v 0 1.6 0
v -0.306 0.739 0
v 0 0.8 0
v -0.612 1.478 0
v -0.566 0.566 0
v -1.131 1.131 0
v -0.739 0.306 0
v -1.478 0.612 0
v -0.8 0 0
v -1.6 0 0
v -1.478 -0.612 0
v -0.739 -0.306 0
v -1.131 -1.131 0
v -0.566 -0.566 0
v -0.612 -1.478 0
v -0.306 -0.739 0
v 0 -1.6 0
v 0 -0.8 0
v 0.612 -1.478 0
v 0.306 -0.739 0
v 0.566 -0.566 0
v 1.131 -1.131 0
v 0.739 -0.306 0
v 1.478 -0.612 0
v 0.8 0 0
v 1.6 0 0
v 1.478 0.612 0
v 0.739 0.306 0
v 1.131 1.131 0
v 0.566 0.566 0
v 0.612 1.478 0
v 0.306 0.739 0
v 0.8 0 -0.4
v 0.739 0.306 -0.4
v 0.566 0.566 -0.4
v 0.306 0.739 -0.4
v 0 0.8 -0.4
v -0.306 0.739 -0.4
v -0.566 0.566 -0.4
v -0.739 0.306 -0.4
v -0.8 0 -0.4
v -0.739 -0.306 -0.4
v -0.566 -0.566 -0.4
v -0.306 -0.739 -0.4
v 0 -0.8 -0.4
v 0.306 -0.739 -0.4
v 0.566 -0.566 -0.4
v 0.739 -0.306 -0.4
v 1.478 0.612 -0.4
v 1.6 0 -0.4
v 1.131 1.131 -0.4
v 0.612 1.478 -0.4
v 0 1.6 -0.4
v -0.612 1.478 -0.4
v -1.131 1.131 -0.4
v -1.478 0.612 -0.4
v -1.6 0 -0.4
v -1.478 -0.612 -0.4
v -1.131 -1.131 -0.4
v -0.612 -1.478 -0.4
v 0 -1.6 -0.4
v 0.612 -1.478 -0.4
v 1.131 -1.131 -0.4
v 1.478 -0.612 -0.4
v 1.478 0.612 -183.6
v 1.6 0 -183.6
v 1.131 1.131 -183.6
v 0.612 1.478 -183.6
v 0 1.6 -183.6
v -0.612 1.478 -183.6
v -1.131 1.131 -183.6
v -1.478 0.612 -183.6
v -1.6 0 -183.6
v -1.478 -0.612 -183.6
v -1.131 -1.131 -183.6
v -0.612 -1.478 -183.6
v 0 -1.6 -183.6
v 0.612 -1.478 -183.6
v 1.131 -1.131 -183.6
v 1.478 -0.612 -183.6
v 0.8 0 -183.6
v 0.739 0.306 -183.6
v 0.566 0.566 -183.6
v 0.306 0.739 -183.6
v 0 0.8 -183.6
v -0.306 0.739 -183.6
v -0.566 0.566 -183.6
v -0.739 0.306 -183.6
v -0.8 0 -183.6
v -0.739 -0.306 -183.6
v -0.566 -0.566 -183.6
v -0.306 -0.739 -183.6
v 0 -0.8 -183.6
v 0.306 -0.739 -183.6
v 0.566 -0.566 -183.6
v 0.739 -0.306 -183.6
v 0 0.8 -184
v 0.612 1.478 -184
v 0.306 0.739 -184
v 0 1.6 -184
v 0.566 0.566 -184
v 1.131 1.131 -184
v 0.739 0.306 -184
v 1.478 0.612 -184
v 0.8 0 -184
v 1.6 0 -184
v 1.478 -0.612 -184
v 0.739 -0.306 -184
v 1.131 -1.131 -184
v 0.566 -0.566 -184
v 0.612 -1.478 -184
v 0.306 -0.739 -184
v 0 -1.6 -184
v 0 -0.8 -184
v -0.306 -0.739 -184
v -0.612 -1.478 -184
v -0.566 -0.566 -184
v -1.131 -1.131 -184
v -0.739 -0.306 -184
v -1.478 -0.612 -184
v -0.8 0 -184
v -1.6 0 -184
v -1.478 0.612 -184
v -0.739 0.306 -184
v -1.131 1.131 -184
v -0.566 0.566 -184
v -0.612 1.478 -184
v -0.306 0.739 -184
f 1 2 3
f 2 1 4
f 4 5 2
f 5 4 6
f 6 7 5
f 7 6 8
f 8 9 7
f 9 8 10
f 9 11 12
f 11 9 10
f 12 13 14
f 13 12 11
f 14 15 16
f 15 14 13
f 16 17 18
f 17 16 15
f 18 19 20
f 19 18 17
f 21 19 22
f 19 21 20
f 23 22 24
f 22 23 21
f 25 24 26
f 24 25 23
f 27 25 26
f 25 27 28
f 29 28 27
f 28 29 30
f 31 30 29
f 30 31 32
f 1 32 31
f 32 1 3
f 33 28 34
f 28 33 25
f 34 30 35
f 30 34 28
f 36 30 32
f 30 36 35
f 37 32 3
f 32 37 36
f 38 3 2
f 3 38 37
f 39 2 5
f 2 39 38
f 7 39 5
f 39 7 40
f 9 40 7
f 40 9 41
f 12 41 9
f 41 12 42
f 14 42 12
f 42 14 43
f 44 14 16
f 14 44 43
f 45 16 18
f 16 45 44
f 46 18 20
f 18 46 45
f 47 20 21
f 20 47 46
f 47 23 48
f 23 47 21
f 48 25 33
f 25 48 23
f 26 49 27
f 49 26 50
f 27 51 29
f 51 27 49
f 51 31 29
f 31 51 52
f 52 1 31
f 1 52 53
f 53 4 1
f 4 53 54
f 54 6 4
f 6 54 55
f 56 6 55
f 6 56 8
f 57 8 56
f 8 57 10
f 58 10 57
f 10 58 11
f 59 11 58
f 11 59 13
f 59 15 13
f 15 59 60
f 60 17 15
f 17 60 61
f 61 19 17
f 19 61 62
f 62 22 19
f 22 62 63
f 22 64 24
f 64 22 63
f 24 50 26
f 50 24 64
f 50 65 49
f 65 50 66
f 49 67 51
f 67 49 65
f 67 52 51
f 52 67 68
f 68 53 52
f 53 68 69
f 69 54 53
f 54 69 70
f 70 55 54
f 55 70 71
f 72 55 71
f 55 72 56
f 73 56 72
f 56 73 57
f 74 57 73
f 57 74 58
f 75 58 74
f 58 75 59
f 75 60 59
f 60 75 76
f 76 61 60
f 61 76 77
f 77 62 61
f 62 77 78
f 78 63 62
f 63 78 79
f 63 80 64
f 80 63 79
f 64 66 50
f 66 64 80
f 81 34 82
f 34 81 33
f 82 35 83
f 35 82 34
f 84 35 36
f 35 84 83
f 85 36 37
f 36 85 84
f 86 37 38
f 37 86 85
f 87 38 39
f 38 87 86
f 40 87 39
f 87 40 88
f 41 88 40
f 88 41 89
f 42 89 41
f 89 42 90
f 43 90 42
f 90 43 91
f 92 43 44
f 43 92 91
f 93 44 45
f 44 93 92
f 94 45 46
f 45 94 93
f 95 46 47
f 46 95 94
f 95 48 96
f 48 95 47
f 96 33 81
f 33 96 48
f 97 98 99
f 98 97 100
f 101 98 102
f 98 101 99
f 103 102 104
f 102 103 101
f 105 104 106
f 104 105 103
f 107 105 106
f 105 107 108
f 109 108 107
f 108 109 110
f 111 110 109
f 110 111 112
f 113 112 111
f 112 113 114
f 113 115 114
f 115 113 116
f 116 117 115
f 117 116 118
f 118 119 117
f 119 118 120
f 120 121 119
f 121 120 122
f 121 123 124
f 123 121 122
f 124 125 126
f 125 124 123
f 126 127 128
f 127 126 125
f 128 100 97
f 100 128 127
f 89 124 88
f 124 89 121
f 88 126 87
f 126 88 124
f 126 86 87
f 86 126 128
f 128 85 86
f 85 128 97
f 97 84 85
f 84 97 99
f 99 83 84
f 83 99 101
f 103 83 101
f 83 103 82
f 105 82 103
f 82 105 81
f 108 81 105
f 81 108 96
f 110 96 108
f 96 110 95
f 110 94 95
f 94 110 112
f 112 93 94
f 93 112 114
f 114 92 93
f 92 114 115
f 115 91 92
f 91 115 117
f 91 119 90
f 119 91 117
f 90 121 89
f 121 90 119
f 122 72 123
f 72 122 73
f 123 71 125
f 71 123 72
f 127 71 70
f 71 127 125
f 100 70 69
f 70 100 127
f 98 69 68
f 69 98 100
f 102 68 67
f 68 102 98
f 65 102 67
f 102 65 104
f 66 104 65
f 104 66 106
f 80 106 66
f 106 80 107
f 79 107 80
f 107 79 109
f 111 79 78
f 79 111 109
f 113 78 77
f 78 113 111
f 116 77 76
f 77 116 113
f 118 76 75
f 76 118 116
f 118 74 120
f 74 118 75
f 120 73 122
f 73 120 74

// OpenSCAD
// file: ../p/4-4ring1.scad
use <../lib.scad>
function ldraw_lib__4_4ring1() = [
// 0 Ring  1 x 1.0
// 0 Name: 4-4ring1.dat
// 0 Author: James Jessiman
// 0 !LDRAW_ORG Primitive UPDATE 2009-01
// 0 !LICENSE Licensed under CC BY 2.0 and CC BY 4.0 : see CAreadme.txt
// 
// 0 BFC CERTIFY CCW
  [0,"BFC","CERTIFY"],
  [0,"BFC","CCW"],
// 
// 0 !HISTORY 1998-12-15 [PTadmin] Official Update 1998-10
// 0 !HISTORY 2002-04-08 [BrickCaster] Modified for BFC compliance
// 0 !HISTORY 2002-04-25 [PTadmin] Official Update 2002-02
// 0 !HISTORY 2007-06-24 [PTadmin] Header formatted for Contributor Agreement
// 0 !HISTORY 2008-07-01 [PTadmin] Official Update 2008-01
// 0 !HISTORY 2008-08-26 [cwdee] Switch polygon winding and rename
// 0 !HISTORY 2009-05-02 [PTadmin] Official Update 2009-01
// 
// 
// 4 16 -0.7654 0 1.8478 -0.3827 0 0.9239 0 0 1 0 0 2
  [4,16,-0.7654,0,1.8478,-0.3827,0,0.9239,0,0,1,0,0,2],
// 4 16 -1.4142 0 1.4142 -0.7071 0 0.7071 -0.3827 0 0.9239 -0.7654 0 1.8478
  [4,16,-1.4142,0,1.4142,-0.7071,0,0.7071,-0.3827,0,0.9239,-0.7654,0,1.8478],
// 4 16 -1.8478 0 0.7654 -0.9239 0 0.3827 -0.7071 0 0.7071 -1.4142 0 1.41420
  [4,16,-1.8478,0,0.7654,-0.9239,0,0.3827,-0.7071,0,0.7071,-1.4142,0,1.41420],
// 4 16 -2 0 0 -1 0 0 -0.9239 0 0.3827 -1.8478 0 0.7654
  [4,16,-2,0,0,-1,0,0,-0.9239,0,0.3827,-1.8478,0,0.7654],
// 4 16 -1.8478 0 -0.7654 -0.9239 0 -0.3827 -1 0 0 -2 0 0
  [4,16,-1.8478,0,-0.7654,-0.9239,0,-0.3827,-1,0,0,-2,0,0],
// 4 16 -1.4142 0 -1.4142 -0.7071 0 -0.7071 -0.9239 0 -0.3827 -1.8478 0 -0.7654
  [4,16,-1.4142,0,-1.4142,-0.7071,0,-0.7071,-0.9239,0,-0.3827,-1.8478,0,-0.7654],
// 4 16 -0.7654 0 -1.8478 -0.3827 0 -0.9239 -0.7071 0 -0.7071 -1.4142 0 -1.4142
  [4,16,-0.7654,0,-1.8478,-0.3827,0,-0.9239,-0.7071,0,-0.7071,-1.4142,0,-1.4142],
// 4 16 0 0 -2 0 0 -1 -0.3827 0 -0.9239 -0.7654 0 -1.8478
  [4,16,0,0,-2,0,0,-1,-0.3827,0,-0.9239,-0.7654,0,-1.8478],
// 4 16 0.7654 0 -1.8478 0.3827 0 -0.9239 0 0 -1 0 0 -2
  [4,16,0.7654,0,-1.8478,0.3827,0,-0.9239,0,0,-1,0,0,-2],
// 4 16 1.4142 0 -1.4142 0.7071 0 -0.7071 0.3827 0 -0.9239 0.7654 0 -1.8478
  [4,16,1.4142,0,-1.4142,0.7071,0,-0.7071,0.3827,0,-0.9239,0.7654,0,-1.8478],
// 4 16 1.8478 0 -0.7654 0.9239 0 -0.3827 0.7071 0 -0.7071 1.4142 0 -1.4142
  [4,16,1.8478,0,-0.7654,0.9239,0,-0.3827,0.7071,0,-0.7071,1.4142,0,-1.4142],
// 4 16 2 0 0 1 0 0 0.9239 0 -0.3827 1.8478 0 -0.7654
  [4,16,2,0,0,1,0,0,0.9239,0,-0.3827,1.8478,0,-0.7654],
// 4 16 1.8478 0 0.7654 0.9239 0 0.3827 1 0 0 2 0 0
  [4,16,1.8478,0,0.7654,0.9239,0,0.3827,1,0,0,2,0,0],
// 4 16 1.4142 0 1.4142 0.7071 0 0.7071 0.9239 0 0.3827 1.8478 0 0.7654
  [4,16,1.4142,0,1.4142,0.7071,0,0.7071,0.9239,0,0.3827,1.8478,0,0.7654],
// 4 16 0.7654 0 1.8478 0.3827 0 0.9239 0.7071 0 0.7071 1.4142 0 1.4142
  [4,16,0.7654,0,1.8478,0.3827,0,0.9239,0.7071,0,0.7071,1.4142,0,1.4142],
// 4 16 0 0 2 0 0 1 0.3827 0 0.9239 0.7654 0 1.8478
  [4,16,0,0,2,0,0,1,0.3827,0,0.9239,0.7654,0,1.8478],
// 0
];
module ldraw_lib__4_4ring1(step=0, col=false, unit=2/5, alt=false, line=0.2, solid=!$preview)
    makepoly(ldraw_lib__4_4ring1(), step=step, col=col, unit=unit, alt=alt, line=line, solid=solid);
ldraw_lib__4_4ring1(line=0.2);
// file: ../p/4-4edge.scad
use <../lib.scad>
function ldraw_lib__4_4edge() = [
// 0 Circle 1.0
// 0 Name: 4-4edge.dat
// 0 Author: James Jessiman
// 0 !LDRAW_ORG Primitive UPDATE 2017-01
// 0 !LICENSE Licensed under CC BY 2.0 and CC BY 4.0 : see CAreadme.txt
// 
// 0 BFC CERTIFY CCW
  [0,"BFC","CERTIFY"],
  [0,"BFC","CCW"],
// 
// 0 !HISTORY 1998-12-15 [PTadmin] Official Update 1998-10
// 0 !HISTORY 2005-12-28 [PTadmin] Official Update 2005-01
// 0 !HISTORY 2007-06-24 [PTadmin] Header formatted for Contributor Agreement
// 0 !HISTORY 2008-07-01 [PTadmin] Official Update 2008-01
// 0 !HISTORY 2017-01-15 [Steffen] BFCed
// 0 !HISTORY 2017-12-30 [PTadmin] Official Update 2017-01
// 
// 
// 2 24 1 0 0 0.9239 0 0.3827
  [2,24,1,0,0,0.9239,0,0.3827],
// 2 24 0.9239 0 0.3827 0.7071 0 0.7071
  [2,24,0.9239,0,0.3827,0.7071,0,0.7071],
// 2 24 0.7071 0 0.7071 0.3827 0 0.9239
  [2,24,0.7071,0,0.7071,0.3827,0,0.9239],
// 2 24 0.3827 0 0.9239 0 0 1
  [2,24,0.3827,0,0.9239,0,0,1],
// 2 24 0 0 1 -0.3827 0 0.9239
  [2,24,0,0,1,-0.3827,0,0.9239],
// 2 24 -0.3827 0 0.9239 -0.7071 0 0.7071
  [2,24,-0.3827,0,0.9239,-0.7071,0,0.7071],
// 2 24 -0.7071 0 0.7071 -0.9239 0 0.3827
  [2,24,-0.7071,0,0.7071,-0.9239,0,0.3827],
// 2 24 -0.9239 0 0.3827 -1 0 -0
  [2,24,-0.9239,0,0.3827,-1,0,-0],
// 2 24 -1 0 -0 -0.9239 0 -0.3827
  [2,24,-1,0,-0,-0.9239,0,-0.3827],
// 2 24 -0.9239 0 -0.3827 -0.7071 0 -0.7071
  [2,24,-0.9239,0,-0.3827,-0.7071,0,-0.7071],
// 2 24 -0.7071 0 -0.7071 -0.3827 0 -0.9239
  [2,24,-0.7071,0,-0.7071,-0.3827,0,-0.9239],
// 2 24 -0.3827 0 -0.9239 0 0 -1
  [2,24,-0.3827,0,-0.9239,0,0,-1],
// 2 24 0 0 -1 0.3827 0 -0.9239
  [2,24,0,0,-1,0.3827,0,-0.9239],
// 2 24 0.3827 0 -0.9239 0.7071 0 -0.7071
  [2,24,0.3827,0,-0.9239,0.7071,0,-0.7071],
// 2 24 0.7071 0 -0.7071 0.9239 0 -0.3827
  [2,24,0.7071,0,-0.7071,0.9239,0,-0.3827],
// 2 24 0.9239 0 -0.3827 1 0 0
  [2,24,0.9239,0,-0.3827,1,0,0],
];
module ldraw_lib__4_4edge(step=0, col=false, unit=2/5, alt=false, line=0.2, solid=!$preview)
    makepoly(ldraw_lib__4_4edge(), step=step, col=col, unit=unit, alt=alt, line=line, solid=solid);
ldraw_lib__4_4edge(line=0.2);
// file: ../p/4-4cyli.scad
use <../lib.scad>
function ldraw_lib__4_4cyli() = [
// 0 Cylinder 1.0
// 0 Name: 4-4cyli.dat
// 0 Author: James Jessiman
// 0 !LDRAW_ORG Primitive UPDATE 2005-01
// 0 !LICENSE Licensed under CC BY 2.0 and CC BY 4.0 : see CAreadme.txt
// 
// 0 BFC CERTIFY CCW
  [0,"BFC","CERTIFY"],
  [0,"BFC","CCW"],
// 
// 0 !HISTORY 1998-12-15 [PTadmin] Official Update 1998-10
// 0 !HISTORY 2002-03-23 [sbliss] Added BFC statement; merged headers from files in distributions LDraw 0.27 and Complete.
// 0 !HISTORY 2002-04-25 [PTadmin] Official Update 2002-02
// 0 !HISTORY 2004-12-14 [guyvivan] BFC CCW
// 0 !HISTORY 2005-12-28 [PTadmin] Official Update 2005-01
// 0 !HISTORY 2007-06-24 [PTadmin] Header formatted for Contributor Agreement
// 0 !HISTORY 2008-07-01 [PTadmin] Official Update 2008-01
// 
// 
// 4 16 1 1 0 0.9239 1 0.3827 0.9239 0 0.3827 1 0 0
  [4,16,1,1,0,0.9239,1,0.3827,0.9239,0,0.3827,1,0,0],
// 5 24 1 0 0 1 1 0 0.9239 0 0.3827 0.9239 0 -0.3827
  [5,24,1,0,0,1,1,0,0.9239,0,0.3827,0.9239,0,-0.3827],
// 4 16 0.9239 1 0.3827 0.7071 1 0.7071 0.7071 0 0.7071 0.9239 0 0.3827
  [4,16,0.9239,1,0.3827,0.7071,1,0.7071,0.7071,0,0.7071,0.9239,0,0.3827],
// 5 24 0.9239 0 0.3827 0.9239 1 0.3827 0.7071 0 0.7071 1 0 0
  [5,24,0.9239,0,0.3827,0.9239,1,0.3827,0.7071,0,0.7071,1,0,0],
// 4 16 0.7071 1 0.7071 0.3827 1 0.9239 0.3827 0 0.9239 0.7071 0 0.7071
  [4,16,0.7071,1,0.7071,0.3827,1,0.9239,0.3827,0,0.9239,0.7071,0,0.7071],
// 5 24 0.7071 0 0.7071 0.7071 1 0.7071 0.3827 0 0.9239 0.9239 0 0.3827
  [5,24,0.7071,0,0.7071,0.7071,1,0.7071,0.3827,0,0.9239,0.9239,0,0.3827],
// 4 16 0.3827 1 0.9239 0 1 1 0 0 1 0.3827 0 0.9239
  [4,16,0.3827,1,0.9239,0,1,1,0,0,1,0.3827,0,0.9239],
// 5 24 0.3827 0 0.9239 0.3827 1 0.9239 0 0 1 0.7071 0 0.7071
  [5,24,0.3827,0,0.9239,0.3827,1,0.9239,0,0,1,0.7071,0,0.7071],
// 4 16 0 1 1 -0.3827 1 0.9239 -0.3827 0 0.9239 0 0 1
  [4,16,0,1,1,-0.3827,1,0.9239,-0.3827,0,0.9239,0,0,1],
// 5 24 0 0 1 0 1 1 -0.3827 0 0.9239 0.3827 0 0.9239
  [5,24,0,0,1,0,1,1,-0.3827,0,0.9239,0.3827,0,0.9239],
// 4 16 -0.3827 1 0.9239 -0.7071 1 0.7071 -0.7071 0 0.7071 -0.3827 0 0.9239
  [4,16,-0.3827,1,0.9239,-0.7071,1,0.7071,-0.7071,0,0.7071,-0.3827,0,0.9239],
// 5 24 -0.3827 0 0.9239 -0.3827 1 0.9239 -0.7071 0 0.7071 0 0 1
  [5,24,-0.3827,0,0.9239,-0.3827,1,0.9239,-0.7071,0,0.7071,0,0,1],
// 4 16 -0.7071 1 0.7071 -0.9239 1 0.3827 -0.9239 0 0.3827 -0.7071 0 0.7071
  [4,16,-0.7071,1,0.7071,-0.9239,1,0.3827,-0.9239,0,0.3827,-0.7071,0,0.7071],
// 5 24 -0.7071 0 0.7071 -0.7071 1 0.7071 -0.9239 0 0.3827 -0.3827 0 0.9239
  [5,24,-0.7071,0,0.7071,-0.7071,1,0.7071,-0.9239,0,0.3827,-0.3827,0,0.9239],
// 4 16 -0.9239 1 0.3827 -1 1 0 -1 0 0 -0.9239 0 0.3827
  [4,16,-0.9239,1,0.3827,-1,1,0,-1,0,0,-0.9239,0,0.3827],
// 5 24 -0.9239 0 0.3827 -0.9239 1 0.3827 -1 0 0 -0.7071 0 0.7071
  [5,24,-0.9239,0,0.3827,-0.9239,1,0.3827,-1,0,0,-0.7071,0,0.7071],
// 4 16 -1 1 0 -0.9239 1 -0.3827 -0.9239 0 -0.3827 -1 0 0
  [4,16,-1,1,0,-0.9239,1,-0.3827,-0.9239,0,-0.3827,-1,0,0],
// 5 24 -1 0 0 -1 1 0 -0.9239 0 -0.3827 -0.9239 0 0.3827
  [5,24,-1,0,0,-1,1,0,-0.9239,0,-0.3827,-0.9239,0,0.3827],
// 4 16 -0.9239 1 -0.3827 -0.7071 1 -0.7071 -0.7071 0 -0.7071 -0.9239 0 -0.3827
  [4,16,-0.9239,1,-0.3827,-0.7071,1,-0.7071,-0.7071,0,-0.7071,-0.9239,0,-0.3827],
// 5 24 -0.9239 0 -0.3827 -0.9239 1 -0.3827 -0.7071 0 -0.7071 -1 0 0
  [5,24,-0.9239,0,-0.3827,-0.9239,1,-0.3827,-0.7071,0,-0.7071,-1,0,0],
// 4 16 -0.7071 1 -0.7071 -0.3827 1 -0.9239 -0.3827 0 -0.9239 -0.7071 0 -0.7071
  [4,16,-0.7071,1,-0.7071,-0.3827,1,-0.9239,-0.3827,0,-0.9239,-0.7071,0,-0.7071],
// 5 24 -0.7071 0 -0.7071 -0.7071 1 -0.7071 -0.3827 0 -0.9239 -0.9239 0 -0.3827
  [5,24,-0.7071,0,-0.7071,-0.7071,1,-0.7071,-0.3827,0,-0.9239,-0.9239,0,-0.3827],
// 4 16 -0.3827 1 -0.9239 0 1 -1 0 0 -1 -0.3827 0 -0.9239
  [4,16,-0.3827,1,-0.9239,0,1,-1,0,0,-1,-0.3827,0,-0.9239],
// 5 24 -0.3827 0 -0.9239 -0.3827 1 -0.9239 0 0 -1 -0.7071 0 -0.7071
  [5,24,-0.3827,0,-0.9239,-0.3827,1,-0.9239,0,0,-1,-0.7071,0,-0.7071],
// 4 16 0 1 -1 0.3827 1 -0.9239 0.3827 0 -0.9239 0 0 -1
  [4,16,0,1,-1,0.3827,1,-0.9239,0.3827,0,-0.9239,0,0,-1],
// 5 24 0 0 -1 0 1 -1 0.3827 0 -0.9239 -0.3827 0 -0.9239
  [5,24,0,0,-1,0,1,-1,0.3827,0,-0.9239,-0.3827,0,-0.9239],
// 4 16 0.3827 1 -0.9239 0.7071 1 -0.7071 0.7071 0 -0.7071 0.3827 0 -0.9239
  [4,16,0.3827,1,-0.9239,0.7071,1,-0.7071,0.7071,0,-0.7071,0.3827,0,-0.9239],
// 5 24 0.3827 0 -0.9239 0.3827 1 -0.9239 0.7071 0 -0.7071 0 0 -1
  [5,24,0.3827,0,-0.9239,0.3827,1,-0.9239,0.7071,0,-0.7071,0,0,-1],
// 4 16 0.7071 1 -0.7071 0.9239 1 -0.3827 0.9239 0 -0.3827 0.7071 0 -0.7071
  [4,16,0.7071,1,-0.7071,0.9239,1,-0.3827,0.9239,0,-0.3827,0.7071,0,-0.7071],
// 5 24 0.7071 0 -0.7071 0.7071 1 -0.7071 0.9239 0 -0.3827 0.3827 0 -0.9239
  [5,24,0.7071,0,-0.7071,0.7071,1,-0.7071,0.9239,0,-0.3827,0.3827,0,-0.9239],
// 4 16 0.9239 1 -0.3827 1 1 0 1 0 0 0.9239 0 -0.3827
  [4,16,0.9239,1,-0.3827,1,1,0,1,0,0,0.9239,0,-0.3827],
// 5 24 0.9239 0 -0.3827 0.9239 1 -0.3827 1 0 0 0.7071 0 -0.7071
  [5,24,0.9239,0,-0.3827,0.9239,1,-0.3827,1,0,0,0.7071,0,-0.7071],
// 0
];
module ldraw_lib__4_4cyli(step=0, col=false, unit=2/5, alt=false, line=0.2, solid=!$preview)
    makepoly(ldraw_lib__4_4cyli(), step=step, col=col, unit=unit, alt=alt, line=line, solid=solid);
ldraw_lib__4_4cyli(line=0.2);
// file: u9053.scad
use <../lib.scad>
use <../p/4-4cyli.scad>
use <../p/4-4edge.scad>
use <../p/4-4ring1.scad>
function ldraw_lib__u9053() = [
// 0 ~Technic Flex-System Hose End
// 0 Name: u9053.dat
// 0 Author: William Howard [WilliamH]
// 0 !LDRAW_ORG Part UPDATE 2011-02
// 0 !LICENSE Licensed under CC BY 2.0 and CC BY 4.0 : see CAreadme.txt
// 
// 0 BFC CERTIFY CCW
  [0,"BFC","CERTIFY"],
  [0,"BFC","CCW"],
// 
// 0 !HISTORY 2011-12-21 [cwdee] Reworked subparting technique
// 0 !HISTORY 2011-12-23 [PTadmin] Renamed from 76
// 0 !HISTORY 2011-12-29 [PTadmin] Official Update 2011-02
// 
// 
// 1 16 0 0 0 2 0 0 0 1 0 0 0 2 4-4ring1.dat
  [1,16,0,0,0,2,0,0,0,1,0,0,0,2, ldraw_lib__4_4ring1()],
// 1 16 0 0 0 2 0 0 0 1 0 0 0 2 4-4edge.dat
  [1,16,0,0,0,2,0,0,0,1,0,0,0,2, ldraw_lib__4_4edge()],
// 0 BFC INVERTNEXT
  [0,"BFC","INVERTNEXT"],
// 1 16 0 0 0 2 0 0 0 1 0 0 0 2 4-4cyli.dat
  [1,16,0,0,0,2,0,0,0,1,0,0,0,2, ldraw_lib__4_4cyli()],
// 1 16 0 0 0 4 0 0 0 1 0 0 0 4 4-4edge.dat
  [1,16,0,0,0,4,0,0,0,1,0,0,0,4, ldraw_lib__4_4edge()],
// 1 16 0 0 0 4 0 0 0 1 0 0 0 4 4-4cyli.dat
  [1,16,0,0,0,4,0,0,0,1,0,0,0,4, ldraw_lib__4_4cyli()],
// 0
];
module ldraw_lib__u9053(step=0, col=false, unit=2/5, alt=false, line=0.2, solid=!$preview)
    makepoly(ldraw_lib__u9053(), step=step, col=col, unit=unit, alt=alt, line=line, solid=solid);
ldraw_lib__u9053(line=0.2);
// file: 77.scad
use <../lib.scad>
use <../p/4-4cyli.scad>
function ldraw_lib__77() = [
// 0 ~Technic Flex-System Hose Segment
// 0 Name: 77.dat
// 0 Author: William Howard [WilliamH]
// 0 !LDRAW_ORG Part UPDATE 2011-02
// 0 !LICENSE Licensed under CC BY 2.0 and CC BY 4.0 : see CAreadme.txt
// 
// 0 BFC CERTIFY CCW
  [0,"BFC","CERTIFY"],
  [0,"BFC","CCW"],
// 
// 0 !HISTORY 2011-12-21 [cwdee] Reworked subparting technique
// 0 !HISTORY 2011-12-29 [PTadmin] Official Update 2011-02
// 
// 
// 1 16 0 0 0 4 0 0 0 1 0 0 0 4 4-4cyli.dat
  [1,16,0,0,0,4,0,0,0,1,0,0,0,4, ldraw_lib__4_4cyli()],
// 0 BFC INVERTNEXT
  [0,"BFC","INVERTNEXT"],
// 1 16 0 0 0 2 0 0 0 1 0 0 0 2 4-4cyli.dat
  [1,16,0,0,0,2,0,0,0,1,0,0,0,2, ldraw_lib__4_4cyli()],
// 0
];
module ldraw_lib__77(step=0, col=false, unit=2/5, alt=false, line=0.2, solid=!$preview)
    makepoly(ldraw_lib__77(), step=step, col=col, unit=unit, alt=alt, line=line, solid=solid);
ldraw_lib__77(line=0.2);
// main file
use <../lib.scad>
use <77.scad>
use <u9053.scad>
function ldraw_lib__76254() = [
// 0 Technic Flex-System Hose 23L (460LDU)
// 0 Name: 76254.dat
// 0 Author: Tim Gould [timgould]
// 0 !LDRAW_ORG Part UPDATE 2011-02
// 0 !LICENSE Licensed under CC BY 2.0 and CC BY 4.0 : see CAreadme.txt
// 
// 0 BFC CERTIFY CCW
  [0,"BFC","CERTIFY"],
  [0,"BFC","CCW"],
// 
// 0 !KEYWORDS bar, tube
// 
// 0 !HISTORY 2011-12-29 [PTadmin] Official Update 2011-02
// 
// 
// 1 16 0 0 0 1 0 0 0 1 0 0 0 1 u9053.dat
  [1,16,0,0,0,1,0,0,0,1,0,0,0,1, ldraw_lib__u9053()],
// 1 16 0 1 0 1 0 0 0 458 0 0 0 1 77.dat
  [1,16,0,1,0,1,0,0,0,458,0,0,0,1, ldraw_lib__77()],
// 1 16 0 460 0 -1 0 0 0 -1 0 0 0 1 u9053.dat
  [1,16,0,460,0,-1,0,0,0,-1,0,0,0,1, ldraw_lib__u9053()],
];
module ldraw_lib__76254(step=0, col=false, unit=2/5, alt=false, line=0.2, solid=!$preview)
    makepoly(ldraw_lib__76254(), step=step, col=col, unit=unit, alt=alt, line=line, solid=solid);
ldraw_lib__76254(line=0.2);
